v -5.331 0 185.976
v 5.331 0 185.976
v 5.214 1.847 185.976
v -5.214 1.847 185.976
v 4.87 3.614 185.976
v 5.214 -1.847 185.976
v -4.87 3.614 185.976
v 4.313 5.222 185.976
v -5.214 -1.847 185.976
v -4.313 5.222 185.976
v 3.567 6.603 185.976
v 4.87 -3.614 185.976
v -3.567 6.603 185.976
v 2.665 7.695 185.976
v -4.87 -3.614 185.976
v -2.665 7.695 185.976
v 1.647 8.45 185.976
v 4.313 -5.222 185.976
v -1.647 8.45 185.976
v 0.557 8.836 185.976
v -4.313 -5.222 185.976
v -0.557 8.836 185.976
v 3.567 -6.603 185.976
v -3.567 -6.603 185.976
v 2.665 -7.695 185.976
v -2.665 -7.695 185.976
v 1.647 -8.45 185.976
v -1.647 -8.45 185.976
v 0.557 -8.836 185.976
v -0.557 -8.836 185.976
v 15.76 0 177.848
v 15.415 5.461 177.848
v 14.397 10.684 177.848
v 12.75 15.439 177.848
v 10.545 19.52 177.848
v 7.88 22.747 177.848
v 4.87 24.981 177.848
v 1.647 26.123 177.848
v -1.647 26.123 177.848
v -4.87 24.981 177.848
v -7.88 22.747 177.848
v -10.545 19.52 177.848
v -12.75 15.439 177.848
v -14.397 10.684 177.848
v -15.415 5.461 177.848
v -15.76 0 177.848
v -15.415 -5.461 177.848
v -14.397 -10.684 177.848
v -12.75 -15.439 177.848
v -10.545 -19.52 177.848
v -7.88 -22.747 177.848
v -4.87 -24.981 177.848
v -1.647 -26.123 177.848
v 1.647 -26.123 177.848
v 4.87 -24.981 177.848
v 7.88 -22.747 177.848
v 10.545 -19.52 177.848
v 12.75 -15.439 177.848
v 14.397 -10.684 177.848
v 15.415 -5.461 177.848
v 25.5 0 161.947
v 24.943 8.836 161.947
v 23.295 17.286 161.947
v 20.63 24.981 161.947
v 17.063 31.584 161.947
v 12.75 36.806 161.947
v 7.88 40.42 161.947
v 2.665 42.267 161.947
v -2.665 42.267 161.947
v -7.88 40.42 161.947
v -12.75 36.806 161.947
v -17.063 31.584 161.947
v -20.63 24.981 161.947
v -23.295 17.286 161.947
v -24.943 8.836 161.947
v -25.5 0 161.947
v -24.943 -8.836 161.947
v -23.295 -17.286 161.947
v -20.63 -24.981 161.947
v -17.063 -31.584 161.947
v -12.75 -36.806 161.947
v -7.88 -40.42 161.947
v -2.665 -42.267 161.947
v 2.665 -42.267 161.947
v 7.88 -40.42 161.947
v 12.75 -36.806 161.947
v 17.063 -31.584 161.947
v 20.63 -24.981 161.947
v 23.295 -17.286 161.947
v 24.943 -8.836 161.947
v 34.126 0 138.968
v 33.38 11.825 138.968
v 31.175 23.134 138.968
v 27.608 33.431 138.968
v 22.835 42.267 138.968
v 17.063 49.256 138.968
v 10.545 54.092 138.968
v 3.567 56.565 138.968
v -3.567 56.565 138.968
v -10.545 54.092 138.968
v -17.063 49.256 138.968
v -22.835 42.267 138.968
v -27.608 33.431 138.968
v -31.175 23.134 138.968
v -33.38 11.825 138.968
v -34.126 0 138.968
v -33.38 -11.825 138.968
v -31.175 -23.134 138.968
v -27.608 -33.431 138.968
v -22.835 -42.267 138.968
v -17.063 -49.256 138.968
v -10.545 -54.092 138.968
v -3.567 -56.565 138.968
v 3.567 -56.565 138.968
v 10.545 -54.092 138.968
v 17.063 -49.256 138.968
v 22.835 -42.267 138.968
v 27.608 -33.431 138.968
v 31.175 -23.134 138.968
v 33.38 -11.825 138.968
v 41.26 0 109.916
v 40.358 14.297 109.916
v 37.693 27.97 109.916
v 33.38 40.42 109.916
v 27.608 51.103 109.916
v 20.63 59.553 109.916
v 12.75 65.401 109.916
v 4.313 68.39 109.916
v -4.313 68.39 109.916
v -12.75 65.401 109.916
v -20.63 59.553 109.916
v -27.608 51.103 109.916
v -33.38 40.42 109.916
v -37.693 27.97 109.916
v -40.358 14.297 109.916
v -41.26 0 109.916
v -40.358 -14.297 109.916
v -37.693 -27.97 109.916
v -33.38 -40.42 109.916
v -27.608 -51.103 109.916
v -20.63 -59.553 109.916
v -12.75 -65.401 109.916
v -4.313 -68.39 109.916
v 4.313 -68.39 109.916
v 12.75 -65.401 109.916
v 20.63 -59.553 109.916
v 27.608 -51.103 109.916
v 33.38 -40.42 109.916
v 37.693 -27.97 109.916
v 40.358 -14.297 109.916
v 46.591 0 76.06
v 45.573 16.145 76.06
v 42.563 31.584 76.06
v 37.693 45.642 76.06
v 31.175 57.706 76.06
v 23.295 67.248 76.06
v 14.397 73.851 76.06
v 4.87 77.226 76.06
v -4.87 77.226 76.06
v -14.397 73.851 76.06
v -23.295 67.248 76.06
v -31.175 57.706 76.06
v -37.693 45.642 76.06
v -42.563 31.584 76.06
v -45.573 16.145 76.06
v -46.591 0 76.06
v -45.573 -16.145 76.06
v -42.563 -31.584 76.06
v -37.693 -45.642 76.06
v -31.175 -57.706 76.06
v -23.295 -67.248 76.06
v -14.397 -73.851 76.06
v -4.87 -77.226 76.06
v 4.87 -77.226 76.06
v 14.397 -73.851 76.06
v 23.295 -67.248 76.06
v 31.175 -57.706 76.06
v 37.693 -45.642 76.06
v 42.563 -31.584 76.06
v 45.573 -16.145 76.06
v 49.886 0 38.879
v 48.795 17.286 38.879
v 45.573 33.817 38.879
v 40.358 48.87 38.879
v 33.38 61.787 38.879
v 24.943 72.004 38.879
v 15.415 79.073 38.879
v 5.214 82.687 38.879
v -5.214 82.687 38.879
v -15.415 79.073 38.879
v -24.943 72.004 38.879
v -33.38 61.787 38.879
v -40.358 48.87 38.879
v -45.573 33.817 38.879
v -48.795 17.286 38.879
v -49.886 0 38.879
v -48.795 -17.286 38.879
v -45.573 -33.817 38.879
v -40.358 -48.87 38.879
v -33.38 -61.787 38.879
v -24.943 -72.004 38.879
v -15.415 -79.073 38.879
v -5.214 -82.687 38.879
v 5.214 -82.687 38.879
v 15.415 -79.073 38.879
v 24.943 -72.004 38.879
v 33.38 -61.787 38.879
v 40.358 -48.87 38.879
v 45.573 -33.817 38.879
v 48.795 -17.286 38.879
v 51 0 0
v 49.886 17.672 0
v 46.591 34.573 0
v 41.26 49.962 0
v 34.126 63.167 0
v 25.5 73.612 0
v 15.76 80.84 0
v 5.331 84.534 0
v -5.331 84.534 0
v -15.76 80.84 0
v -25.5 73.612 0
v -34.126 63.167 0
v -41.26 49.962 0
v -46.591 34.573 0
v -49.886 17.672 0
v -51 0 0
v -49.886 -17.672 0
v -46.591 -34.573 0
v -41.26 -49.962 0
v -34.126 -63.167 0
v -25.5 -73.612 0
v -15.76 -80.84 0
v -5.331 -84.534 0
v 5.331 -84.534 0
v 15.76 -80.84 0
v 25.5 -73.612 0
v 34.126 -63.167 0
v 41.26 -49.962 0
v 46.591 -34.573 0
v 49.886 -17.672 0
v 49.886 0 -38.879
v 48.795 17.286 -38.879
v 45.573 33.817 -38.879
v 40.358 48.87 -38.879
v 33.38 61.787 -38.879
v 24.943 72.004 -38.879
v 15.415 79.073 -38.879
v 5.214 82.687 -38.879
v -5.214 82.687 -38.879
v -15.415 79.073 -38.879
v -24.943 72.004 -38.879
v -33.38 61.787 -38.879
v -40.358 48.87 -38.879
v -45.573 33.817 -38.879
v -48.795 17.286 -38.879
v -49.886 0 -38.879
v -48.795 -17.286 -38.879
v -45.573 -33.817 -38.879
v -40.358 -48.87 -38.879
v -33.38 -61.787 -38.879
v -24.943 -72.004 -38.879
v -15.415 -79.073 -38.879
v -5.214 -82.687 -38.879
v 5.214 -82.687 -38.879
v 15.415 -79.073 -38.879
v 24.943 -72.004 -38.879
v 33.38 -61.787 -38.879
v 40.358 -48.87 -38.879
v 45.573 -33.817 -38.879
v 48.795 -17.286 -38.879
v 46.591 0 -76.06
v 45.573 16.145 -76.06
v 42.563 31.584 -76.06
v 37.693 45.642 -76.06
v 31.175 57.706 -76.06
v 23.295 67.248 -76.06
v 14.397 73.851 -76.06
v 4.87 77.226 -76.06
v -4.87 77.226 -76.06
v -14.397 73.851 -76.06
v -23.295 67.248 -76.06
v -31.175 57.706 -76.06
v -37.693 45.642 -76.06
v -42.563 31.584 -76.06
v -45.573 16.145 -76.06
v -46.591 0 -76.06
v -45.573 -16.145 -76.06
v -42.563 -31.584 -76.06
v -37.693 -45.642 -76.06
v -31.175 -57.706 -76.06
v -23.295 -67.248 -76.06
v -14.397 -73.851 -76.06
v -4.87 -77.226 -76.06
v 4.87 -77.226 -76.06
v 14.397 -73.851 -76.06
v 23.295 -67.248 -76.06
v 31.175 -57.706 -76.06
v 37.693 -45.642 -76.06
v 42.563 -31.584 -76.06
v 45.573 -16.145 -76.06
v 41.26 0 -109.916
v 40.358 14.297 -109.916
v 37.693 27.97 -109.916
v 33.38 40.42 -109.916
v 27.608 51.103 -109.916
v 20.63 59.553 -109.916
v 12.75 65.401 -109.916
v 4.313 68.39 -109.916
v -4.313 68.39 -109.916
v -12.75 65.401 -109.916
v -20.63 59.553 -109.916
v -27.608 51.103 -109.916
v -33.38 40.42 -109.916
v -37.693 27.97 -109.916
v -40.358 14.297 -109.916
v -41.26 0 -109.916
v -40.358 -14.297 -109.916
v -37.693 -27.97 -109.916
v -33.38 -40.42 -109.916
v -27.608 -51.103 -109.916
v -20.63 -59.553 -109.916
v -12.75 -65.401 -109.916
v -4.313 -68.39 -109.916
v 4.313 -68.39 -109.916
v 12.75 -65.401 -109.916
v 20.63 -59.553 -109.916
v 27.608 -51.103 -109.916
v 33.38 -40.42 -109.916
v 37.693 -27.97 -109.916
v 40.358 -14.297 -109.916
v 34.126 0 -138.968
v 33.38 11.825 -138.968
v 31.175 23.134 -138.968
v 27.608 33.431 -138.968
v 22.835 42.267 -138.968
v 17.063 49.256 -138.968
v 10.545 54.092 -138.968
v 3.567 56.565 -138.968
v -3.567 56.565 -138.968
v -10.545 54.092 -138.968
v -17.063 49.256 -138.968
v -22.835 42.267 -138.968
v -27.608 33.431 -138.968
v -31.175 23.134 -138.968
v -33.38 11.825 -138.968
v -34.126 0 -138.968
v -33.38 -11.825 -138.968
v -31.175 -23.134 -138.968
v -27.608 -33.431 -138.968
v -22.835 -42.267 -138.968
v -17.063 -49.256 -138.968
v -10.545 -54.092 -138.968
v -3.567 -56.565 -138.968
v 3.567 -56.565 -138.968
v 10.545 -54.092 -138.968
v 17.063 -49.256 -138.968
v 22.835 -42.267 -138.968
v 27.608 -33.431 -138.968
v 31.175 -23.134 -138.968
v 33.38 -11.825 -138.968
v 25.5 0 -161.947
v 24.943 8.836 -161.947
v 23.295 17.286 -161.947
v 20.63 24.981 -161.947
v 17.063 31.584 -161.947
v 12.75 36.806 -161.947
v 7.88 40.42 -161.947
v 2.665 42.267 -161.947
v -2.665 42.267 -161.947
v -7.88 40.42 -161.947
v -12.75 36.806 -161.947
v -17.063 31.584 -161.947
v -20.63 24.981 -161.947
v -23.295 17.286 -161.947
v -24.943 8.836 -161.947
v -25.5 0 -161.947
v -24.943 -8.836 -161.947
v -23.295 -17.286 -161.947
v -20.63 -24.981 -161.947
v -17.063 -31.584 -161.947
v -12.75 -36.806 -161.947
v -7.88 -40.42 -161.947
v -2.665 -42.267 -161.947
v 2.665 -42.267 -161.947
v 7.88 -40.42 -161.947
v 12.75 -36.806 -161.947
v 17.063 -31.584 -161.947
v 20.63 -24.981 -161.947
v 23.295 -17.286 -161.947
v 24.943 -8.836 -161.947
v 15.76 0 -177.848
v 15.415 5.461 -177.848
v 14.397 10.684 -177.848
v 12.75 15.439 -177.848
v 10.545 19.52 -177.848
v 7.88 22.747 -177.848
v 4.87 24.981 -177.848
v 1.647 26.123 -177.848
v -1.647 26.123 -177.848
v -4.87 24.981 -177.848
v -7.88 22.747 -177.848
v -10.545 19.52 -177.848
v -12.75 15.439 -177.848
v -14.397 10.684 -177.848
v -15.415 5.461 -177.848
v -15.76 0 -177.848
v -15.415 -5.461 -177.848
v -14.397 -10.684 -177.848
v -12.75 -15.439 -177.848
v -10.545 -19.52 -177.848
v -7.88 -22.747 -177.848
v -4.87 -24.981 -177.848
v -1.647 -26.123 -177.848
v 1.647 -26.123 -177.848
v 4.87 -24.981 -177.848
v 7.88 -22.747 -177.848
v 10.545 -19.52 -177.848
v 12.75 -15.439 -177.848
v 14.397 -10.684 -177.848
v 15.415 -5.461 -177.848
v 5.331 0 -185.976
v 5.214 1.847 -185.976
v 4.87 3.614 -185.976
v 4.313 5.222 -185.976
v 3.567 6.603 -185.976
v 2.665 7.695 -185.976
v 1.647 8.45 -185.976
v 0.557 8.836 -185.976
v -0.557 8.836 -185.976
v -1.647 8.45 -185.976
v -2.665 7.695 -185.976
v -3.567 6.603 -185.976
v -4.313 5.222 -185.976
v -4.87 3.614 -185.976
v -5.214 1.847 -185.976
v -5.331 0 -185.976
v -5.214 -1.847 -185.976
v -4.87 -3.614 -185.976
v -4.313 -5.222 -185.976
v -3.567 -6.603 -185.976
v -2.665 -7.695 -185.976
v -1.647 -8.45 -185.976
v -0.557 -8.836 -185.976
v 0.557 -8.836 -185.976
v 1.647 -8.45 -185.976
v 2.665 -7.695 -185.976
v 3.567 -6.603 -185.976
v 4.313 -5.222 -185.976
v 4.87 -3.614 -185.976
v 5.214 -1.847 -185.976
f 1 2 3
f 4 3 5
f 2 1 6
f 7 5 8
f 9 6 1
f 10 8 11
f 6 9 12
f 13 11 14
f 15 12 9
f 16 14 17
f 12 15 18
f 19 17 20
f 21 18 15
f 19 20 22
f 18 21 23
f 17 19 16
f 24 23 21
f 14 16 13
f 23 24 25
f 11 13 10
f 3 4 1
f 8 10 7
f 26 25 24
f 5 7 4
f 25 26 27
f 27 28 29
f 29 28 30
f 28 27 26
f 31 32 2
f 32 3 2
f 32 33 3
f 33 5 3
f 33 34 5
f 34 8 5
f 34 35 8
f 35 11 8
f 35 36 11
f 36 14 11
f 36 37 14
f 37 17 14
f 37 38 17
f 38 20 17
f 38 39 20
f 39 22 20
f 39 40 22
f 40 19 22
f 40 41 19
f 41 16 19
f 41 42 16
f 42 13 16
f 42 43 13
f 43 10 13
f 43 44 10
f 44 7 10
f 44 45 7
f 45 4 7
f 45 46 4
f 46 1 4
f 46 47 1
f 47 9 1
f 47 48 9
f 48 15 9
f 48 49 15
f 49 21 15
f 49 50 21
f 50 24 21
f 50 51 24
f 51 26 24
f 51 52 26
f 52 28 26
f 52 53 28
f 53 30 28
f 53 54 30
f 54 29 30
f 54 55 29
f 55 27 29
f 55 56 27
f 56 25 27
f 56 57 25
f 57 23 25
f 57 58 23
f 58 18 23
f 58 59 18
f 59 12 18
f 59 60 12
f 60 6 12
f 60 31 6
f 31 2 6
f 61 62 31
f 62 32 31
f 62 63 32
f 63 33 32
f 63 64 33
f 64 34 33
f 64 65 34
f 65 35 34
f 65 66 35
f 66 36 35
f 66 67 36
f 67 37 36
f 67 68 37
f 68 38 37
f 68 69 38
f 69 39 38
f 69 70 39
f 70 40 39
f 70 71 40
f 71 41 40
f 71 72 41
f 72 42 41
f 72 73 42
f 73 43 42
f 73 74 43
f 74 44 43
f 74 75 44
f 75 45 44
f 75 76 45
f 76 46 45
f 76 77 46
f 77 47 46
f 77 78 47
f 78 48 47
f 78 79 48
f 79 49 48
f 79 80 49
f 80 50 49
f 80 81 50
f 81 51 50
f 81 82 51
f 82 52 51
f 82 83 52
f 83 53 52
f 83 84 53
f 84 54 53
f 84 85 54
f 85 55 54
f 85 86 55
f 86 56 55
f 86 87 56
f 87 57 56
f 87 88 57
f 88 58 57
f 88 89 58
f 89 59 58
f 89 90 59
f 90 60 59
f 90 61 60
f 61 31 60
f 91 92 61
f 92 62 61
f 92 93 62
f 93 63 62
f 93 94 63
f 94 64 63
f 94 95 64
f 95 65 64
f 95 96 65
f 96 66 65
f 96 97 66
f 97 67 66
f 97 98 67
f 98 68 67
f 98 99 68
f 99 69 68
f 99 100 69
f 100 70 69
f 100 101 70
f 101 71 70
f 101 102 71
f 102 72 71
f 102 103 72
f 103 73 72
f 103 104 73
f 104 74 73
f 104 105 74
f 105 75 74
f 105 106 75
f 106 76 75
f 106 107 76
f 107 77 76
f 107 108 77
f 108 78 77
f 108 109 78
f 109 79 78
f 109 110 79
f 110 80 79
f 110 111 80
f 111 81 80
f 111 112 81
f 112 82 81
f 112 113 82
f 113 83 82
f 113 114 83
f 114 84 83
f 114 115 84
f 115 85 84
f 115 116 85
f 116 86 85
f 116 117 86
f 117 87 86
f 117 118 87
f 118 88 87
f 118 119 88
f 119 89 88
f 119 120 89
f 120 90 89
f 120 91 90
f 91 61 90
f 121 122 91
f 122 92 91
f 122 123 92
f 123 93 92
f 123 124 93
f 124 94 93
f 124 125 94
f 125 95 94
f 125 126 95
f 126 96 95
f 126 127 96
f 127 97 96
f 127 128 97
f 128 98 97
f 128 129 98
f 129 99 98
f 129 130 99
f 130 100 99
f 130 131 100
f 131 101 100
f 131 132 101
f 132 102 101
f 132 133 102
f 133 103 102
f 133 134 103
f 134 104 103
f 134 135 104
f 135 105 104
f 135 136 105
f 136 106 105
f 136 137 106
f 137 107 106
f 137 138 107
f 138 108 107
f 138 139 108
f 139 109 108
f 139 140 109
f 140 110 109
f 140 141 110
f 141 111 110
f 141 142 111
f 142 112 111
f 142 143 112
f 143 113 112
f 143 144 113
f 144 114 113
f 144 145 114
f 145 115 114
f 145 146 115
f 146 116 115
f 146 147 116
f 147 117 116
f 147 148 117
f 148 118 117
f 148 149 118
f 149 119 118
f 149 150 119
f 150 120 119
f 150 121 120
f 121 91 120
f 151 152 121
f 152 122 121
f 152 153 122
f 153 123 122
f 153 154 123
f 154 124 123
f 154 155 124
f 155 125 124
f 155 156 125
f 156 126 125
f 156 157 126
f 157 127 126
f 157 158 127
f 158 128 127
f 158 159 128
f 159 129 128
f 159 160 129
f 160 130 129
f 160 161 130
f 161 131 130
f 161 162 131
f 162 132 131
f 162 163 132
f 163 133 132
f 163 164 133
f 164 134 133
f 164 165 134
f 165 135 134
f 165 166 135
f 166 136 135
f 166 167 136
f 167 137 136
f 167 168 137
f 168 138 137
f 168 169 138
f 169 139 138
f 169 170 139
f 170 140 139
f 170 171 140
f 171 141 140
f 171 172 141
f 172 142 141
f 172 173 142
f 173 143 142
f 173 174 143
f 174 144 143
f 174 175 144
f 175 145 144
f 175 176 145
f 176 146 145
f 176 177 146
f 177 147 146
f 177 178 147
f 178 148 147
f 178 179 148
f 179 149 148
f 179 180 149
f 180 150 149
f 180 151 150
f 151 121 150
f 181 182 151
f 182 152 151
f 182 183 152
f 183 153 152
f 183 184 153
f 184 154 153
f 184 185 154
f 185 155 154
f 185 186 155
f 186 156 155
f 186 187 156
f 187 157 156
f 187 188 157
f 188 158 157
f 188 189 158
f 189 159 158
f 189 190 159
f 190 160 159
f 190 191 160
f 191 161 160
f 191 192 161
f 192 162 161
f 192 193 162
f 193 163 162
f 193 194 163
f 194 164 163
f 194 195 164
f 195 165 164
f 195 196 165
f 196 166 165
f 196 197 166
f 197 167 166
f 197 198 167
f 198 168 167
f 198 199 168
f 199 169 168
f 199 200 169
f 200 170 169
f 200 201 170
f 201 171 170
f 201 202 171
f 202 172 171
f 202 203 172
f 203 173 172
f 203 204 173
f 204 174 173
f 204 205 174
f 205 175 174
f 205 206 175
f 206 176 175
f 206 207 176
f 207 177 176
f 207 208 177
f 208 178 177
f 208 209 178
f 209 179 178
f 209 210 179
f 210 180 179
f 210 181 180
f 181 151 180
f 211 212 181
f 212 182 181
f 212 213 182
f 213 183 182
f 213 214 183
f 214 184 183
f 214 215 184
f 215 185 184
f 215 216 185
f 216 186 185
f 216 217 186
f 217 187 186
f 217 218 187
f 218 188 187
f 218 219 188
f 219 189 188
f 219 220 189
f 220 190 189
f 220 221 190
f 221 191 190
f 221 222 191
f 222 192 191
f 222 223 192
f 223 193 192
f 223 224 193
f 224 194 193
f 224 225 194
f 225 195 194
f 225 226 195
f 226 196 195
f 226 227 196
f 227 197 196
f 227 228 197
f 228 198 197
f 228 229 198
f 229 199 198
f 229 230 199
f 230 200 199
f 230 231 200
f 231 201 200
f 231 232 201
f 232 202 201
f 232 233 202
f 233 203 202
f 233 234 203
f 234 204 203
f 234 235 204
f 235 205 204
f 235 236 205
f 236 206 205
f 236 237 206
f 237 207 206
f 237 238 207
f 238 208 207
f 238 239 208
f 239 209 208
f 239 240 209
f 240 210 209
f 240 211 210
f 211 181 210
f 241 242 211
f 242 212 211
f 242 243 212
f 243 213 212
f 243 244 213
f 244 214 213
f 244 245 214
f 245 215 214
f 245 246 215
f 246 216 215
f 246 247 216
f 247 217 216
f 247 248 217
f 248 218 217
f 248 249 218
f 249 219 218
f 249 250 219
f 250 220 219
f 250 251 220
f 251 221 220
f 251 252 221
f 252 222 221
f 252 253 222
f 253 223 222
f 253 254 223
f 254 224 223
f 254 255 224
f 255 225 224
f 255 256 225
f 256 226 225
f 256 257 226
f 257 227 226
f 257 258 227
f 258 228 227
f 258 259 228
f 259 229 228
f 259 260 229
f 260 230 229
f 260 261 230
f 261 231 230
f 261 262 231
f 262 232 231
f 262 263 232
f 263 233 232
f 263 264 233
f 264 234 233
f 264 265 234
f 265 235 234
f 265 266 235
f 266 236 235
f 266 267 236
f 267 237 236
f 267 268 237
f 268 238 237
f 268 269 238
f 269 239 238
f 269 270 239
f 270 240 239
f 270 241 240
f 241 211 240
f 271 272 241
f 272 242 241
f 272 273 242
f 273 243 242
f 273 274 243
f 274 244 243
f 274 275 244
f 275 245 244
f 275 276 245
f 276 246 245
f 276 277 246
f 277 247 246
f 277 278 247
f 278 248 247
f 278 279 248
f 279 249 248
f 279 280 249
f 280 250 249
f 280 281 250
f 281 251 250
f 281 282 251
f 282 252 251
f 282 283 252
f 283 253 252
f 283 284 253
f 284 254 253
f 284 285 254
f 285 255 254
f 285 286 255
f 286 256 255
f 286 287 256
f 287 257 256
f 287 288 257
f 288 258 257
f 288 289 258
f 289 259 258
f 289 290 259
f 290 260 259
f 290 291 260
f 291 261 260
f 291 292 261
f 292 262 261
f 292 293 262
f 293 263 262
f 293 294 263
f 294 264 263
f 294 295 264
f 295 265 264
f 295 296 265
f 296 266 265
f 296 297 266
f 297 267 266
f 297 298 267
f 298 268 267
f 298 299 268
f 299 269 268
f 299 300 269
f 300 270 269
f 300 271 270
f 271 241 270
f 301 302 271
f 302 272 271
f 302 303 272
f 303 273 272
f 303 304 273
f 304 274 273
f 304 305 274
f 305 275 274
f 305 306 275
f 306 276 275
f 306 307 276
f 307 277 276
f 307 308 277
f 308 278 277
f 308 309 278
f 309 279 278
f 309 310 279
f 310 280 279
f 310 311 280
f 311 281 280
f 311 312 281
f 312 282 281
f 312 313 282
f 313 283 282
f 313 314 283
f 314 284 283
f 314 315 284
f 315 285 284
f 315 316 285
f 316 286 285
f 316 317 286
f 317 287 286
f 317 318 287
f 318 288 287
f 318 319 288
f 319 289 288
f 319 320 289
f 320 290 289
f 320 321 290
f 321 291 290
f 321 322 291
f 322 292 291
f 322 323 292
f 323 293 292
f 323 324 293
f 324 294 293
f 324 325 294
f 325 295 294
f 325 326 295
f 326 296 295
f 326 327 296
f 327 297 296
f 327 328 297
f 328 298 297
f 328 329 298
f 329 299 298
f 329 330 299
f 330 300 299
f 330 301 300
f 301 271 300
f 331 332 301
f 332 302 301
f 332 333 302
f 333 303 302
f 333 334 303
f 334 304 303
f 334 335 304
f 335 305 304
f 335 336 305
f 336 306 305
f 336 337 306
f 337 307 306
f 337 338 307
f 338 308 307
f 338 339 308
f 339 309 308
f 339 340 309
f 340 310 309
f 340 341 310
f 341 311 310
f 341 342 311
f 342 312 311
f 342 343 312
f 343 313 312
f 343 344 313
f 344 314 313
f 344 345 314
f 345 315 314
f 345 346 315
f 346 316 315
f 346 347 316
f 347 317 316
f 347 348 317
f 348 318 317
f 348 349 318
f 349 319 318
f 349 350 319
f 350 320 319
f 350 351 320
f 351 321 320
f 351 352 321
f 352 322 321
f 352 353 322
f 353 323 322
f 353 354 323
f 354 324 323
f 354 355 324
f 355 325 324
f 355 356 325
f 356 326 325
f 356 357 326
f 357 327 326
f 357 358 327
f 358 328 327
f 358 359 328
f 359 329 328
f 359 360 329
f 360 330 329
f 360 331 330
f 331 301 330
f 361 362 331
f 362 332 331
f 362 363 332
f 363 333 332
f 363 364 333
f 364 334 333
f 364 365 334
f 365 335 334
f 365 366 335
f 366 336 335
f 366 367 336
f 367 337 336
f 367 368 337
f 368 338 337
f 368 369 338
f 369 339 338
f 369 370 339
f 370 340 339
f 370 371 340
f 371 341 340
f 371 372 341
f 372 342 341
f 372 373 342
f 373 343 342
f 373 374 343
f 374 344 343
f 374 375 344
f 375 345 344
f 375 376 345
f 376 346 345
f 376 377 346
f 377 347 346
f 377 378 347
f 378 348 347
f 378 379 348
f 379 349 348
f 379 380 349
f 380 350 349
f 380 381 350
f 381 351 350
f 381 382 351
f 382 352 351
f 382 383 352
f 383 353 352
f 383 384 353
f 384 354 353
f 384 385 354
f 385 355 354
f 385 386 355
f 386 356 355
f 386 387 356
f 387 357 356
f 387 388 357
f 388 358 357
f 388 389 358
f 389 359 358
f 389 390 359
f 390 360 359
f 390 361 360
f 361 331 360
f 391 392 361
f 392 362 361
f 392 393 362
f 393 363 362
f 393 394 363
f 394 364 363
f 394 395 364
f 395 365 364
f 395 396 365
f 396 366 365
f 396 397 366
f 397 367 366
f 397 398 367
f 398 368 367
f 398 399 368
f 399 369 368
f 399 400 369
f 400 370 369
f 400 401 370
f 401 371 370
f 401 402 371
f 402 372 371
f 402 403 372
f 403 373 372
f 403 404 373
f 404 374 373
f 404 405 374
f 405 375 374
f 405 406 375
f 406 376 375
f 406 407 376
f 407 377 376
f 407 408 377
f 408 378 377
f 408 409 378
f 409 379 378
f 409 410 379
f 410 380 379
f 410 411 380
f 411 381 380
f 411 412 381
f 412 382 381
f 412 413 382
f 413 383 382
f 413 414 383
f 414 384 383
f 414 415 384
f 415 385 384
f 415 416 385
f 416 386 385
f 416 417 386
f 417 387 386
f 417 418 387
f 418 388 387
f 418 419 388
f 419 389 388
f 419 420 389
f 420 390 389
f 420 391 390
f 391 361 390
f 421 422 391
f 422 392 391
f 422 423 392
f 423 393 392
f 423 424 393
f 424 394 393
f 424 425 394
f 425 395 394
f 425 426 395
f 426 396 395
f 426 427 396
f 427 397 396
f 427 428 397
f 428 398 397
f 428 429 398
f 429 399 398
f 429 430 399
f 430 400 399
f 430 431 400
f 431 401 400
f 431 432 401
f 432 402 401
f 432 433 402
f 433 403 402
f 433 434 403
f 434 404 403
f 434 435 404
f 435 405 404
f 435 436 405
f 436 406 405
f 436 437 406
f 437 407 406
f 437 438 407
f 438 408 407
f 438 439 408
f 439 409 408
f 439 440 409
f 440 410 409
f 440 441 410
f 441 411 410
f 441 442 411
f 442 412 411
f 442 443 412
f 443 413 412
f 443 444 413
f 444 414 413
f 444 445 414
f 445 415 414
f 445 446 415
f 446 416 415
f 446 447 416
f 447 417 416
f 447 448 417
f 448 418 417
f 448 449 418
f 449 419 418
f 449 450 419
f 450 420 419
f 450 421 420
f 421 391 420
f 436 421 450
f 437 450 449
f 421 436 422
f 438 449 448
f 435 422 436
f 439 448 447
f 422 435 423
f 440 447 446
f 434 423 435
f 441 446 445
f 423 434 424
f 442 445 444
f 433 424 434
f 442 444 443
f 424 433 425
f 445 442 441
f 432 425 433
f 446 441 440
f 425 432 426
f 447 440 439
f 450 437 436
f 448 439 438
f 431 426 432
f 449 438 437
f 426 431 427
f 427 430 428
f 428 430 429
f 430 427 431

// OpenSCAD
// Generated by SolidPython 1.0.1 on 2020-07-29 00:46:45


scale(v = [3, 5, 11]) {
	sphere(r = 17);
}
/***********************************************
*********      SolidPython code:      **********
************************************************
 
# import packages: SolidPython
from solid import *
from solid.utils import *
from itertools import chain, combinations, permutations


class Resize:

    def __init__(self, scad_file):
        self.scad_file = scad_file
        #self.scad_file = import_scad(scad_file)
        # cone/cylinder param:
        self.r1 = 0
        self.r2 = 0
        self.h = 0
        # rectangular prism param:
        self.w = 0
        self.l = 0
        # ellipse param:
        self.r = 0

    # import OpenScad code (file name corresponds to shape)


    # classify shape + parameters
    def assign(self, param1, param2, param3):
        if self.scad_file == 'cone.scad':
            self.r1 = param1
            self.r2 = param2
            self.h = param3
        elif self.scad_file == 'cylinder.scad':
            self.r1 = param1
            self.r2 = param2
            self.h = param3
        elif self.scad_file == 'rectangularPrism.scad':
            self.h = param1
            self.l = param2
            self.w = param3
        else:
            self.r = param1
            self.h = param2

    # resize parameters
    def iterate(self):
        x = range(3, 20, 2)
        i = 1
        if self.scad_file == 'cone.scad':
            tempList = list(permutations(x, 2))
            for temp in tempList:
                param1 = temp[0]
                param2 = temp[1]
                filepath = 'produced_scad_files/' + 'cone' + str(param1) + '_' + str(param2) + '_' + '.scad'
                scad_render_to_file(cylinder(h=param1, r1=param2, r2=0), filepath)

        elif self.scad_file == 'cylinder.scad':
            tempList = list(permutations(x, 3))
            for temp in tempList:
                param1 = temp[0]
                param2 = temp[1]
                filepath = 'produced_scad_files/' + 'cylinder' + str(param1) + '_' + str(param2) + '_' + '.scad'
                scad_render_to_file(cylinder(h=param1, r1=param2, r2=param2), filepath)

        elif self.scad_file == 'rectangularPrism.scad':
            tempList = list(permutations(x, 3))
            for temp in tempList:
                param1 = temp[0]
                param2 = temp[1]
                param3 = temp[2]
                filepath = 'produced_scad_files/' + 'rectangularPrism' + str(param1) + '_' + str(param2) + '_' + str(
                    param3) + '.scad'
                scad_render_to_file(cube(size=(param1, param2, param3)), filepath)

        elif self.scad_file == 'ellipse.scad':
            tempList = list(permutations(x, 4))
            for temp in tempList:
                param1 = temp[0]
                param2 = temp[1]
                param3 = temp[2]
                param4 = temp[3]
                filepath = 'produced_scad_files/' + 'ellipse' + str(param1) + '_' + str(param2) + '_' + str(param3) + '_' + str(param4) + '.scad'
                scad_render_to_file(scale([param1, param2, param3])(sphere(r=param4)), filepath)

    def render_to_scadfile(self):
        scad_render_to_file(scad, 'example.scad') 
 
************************************************/
